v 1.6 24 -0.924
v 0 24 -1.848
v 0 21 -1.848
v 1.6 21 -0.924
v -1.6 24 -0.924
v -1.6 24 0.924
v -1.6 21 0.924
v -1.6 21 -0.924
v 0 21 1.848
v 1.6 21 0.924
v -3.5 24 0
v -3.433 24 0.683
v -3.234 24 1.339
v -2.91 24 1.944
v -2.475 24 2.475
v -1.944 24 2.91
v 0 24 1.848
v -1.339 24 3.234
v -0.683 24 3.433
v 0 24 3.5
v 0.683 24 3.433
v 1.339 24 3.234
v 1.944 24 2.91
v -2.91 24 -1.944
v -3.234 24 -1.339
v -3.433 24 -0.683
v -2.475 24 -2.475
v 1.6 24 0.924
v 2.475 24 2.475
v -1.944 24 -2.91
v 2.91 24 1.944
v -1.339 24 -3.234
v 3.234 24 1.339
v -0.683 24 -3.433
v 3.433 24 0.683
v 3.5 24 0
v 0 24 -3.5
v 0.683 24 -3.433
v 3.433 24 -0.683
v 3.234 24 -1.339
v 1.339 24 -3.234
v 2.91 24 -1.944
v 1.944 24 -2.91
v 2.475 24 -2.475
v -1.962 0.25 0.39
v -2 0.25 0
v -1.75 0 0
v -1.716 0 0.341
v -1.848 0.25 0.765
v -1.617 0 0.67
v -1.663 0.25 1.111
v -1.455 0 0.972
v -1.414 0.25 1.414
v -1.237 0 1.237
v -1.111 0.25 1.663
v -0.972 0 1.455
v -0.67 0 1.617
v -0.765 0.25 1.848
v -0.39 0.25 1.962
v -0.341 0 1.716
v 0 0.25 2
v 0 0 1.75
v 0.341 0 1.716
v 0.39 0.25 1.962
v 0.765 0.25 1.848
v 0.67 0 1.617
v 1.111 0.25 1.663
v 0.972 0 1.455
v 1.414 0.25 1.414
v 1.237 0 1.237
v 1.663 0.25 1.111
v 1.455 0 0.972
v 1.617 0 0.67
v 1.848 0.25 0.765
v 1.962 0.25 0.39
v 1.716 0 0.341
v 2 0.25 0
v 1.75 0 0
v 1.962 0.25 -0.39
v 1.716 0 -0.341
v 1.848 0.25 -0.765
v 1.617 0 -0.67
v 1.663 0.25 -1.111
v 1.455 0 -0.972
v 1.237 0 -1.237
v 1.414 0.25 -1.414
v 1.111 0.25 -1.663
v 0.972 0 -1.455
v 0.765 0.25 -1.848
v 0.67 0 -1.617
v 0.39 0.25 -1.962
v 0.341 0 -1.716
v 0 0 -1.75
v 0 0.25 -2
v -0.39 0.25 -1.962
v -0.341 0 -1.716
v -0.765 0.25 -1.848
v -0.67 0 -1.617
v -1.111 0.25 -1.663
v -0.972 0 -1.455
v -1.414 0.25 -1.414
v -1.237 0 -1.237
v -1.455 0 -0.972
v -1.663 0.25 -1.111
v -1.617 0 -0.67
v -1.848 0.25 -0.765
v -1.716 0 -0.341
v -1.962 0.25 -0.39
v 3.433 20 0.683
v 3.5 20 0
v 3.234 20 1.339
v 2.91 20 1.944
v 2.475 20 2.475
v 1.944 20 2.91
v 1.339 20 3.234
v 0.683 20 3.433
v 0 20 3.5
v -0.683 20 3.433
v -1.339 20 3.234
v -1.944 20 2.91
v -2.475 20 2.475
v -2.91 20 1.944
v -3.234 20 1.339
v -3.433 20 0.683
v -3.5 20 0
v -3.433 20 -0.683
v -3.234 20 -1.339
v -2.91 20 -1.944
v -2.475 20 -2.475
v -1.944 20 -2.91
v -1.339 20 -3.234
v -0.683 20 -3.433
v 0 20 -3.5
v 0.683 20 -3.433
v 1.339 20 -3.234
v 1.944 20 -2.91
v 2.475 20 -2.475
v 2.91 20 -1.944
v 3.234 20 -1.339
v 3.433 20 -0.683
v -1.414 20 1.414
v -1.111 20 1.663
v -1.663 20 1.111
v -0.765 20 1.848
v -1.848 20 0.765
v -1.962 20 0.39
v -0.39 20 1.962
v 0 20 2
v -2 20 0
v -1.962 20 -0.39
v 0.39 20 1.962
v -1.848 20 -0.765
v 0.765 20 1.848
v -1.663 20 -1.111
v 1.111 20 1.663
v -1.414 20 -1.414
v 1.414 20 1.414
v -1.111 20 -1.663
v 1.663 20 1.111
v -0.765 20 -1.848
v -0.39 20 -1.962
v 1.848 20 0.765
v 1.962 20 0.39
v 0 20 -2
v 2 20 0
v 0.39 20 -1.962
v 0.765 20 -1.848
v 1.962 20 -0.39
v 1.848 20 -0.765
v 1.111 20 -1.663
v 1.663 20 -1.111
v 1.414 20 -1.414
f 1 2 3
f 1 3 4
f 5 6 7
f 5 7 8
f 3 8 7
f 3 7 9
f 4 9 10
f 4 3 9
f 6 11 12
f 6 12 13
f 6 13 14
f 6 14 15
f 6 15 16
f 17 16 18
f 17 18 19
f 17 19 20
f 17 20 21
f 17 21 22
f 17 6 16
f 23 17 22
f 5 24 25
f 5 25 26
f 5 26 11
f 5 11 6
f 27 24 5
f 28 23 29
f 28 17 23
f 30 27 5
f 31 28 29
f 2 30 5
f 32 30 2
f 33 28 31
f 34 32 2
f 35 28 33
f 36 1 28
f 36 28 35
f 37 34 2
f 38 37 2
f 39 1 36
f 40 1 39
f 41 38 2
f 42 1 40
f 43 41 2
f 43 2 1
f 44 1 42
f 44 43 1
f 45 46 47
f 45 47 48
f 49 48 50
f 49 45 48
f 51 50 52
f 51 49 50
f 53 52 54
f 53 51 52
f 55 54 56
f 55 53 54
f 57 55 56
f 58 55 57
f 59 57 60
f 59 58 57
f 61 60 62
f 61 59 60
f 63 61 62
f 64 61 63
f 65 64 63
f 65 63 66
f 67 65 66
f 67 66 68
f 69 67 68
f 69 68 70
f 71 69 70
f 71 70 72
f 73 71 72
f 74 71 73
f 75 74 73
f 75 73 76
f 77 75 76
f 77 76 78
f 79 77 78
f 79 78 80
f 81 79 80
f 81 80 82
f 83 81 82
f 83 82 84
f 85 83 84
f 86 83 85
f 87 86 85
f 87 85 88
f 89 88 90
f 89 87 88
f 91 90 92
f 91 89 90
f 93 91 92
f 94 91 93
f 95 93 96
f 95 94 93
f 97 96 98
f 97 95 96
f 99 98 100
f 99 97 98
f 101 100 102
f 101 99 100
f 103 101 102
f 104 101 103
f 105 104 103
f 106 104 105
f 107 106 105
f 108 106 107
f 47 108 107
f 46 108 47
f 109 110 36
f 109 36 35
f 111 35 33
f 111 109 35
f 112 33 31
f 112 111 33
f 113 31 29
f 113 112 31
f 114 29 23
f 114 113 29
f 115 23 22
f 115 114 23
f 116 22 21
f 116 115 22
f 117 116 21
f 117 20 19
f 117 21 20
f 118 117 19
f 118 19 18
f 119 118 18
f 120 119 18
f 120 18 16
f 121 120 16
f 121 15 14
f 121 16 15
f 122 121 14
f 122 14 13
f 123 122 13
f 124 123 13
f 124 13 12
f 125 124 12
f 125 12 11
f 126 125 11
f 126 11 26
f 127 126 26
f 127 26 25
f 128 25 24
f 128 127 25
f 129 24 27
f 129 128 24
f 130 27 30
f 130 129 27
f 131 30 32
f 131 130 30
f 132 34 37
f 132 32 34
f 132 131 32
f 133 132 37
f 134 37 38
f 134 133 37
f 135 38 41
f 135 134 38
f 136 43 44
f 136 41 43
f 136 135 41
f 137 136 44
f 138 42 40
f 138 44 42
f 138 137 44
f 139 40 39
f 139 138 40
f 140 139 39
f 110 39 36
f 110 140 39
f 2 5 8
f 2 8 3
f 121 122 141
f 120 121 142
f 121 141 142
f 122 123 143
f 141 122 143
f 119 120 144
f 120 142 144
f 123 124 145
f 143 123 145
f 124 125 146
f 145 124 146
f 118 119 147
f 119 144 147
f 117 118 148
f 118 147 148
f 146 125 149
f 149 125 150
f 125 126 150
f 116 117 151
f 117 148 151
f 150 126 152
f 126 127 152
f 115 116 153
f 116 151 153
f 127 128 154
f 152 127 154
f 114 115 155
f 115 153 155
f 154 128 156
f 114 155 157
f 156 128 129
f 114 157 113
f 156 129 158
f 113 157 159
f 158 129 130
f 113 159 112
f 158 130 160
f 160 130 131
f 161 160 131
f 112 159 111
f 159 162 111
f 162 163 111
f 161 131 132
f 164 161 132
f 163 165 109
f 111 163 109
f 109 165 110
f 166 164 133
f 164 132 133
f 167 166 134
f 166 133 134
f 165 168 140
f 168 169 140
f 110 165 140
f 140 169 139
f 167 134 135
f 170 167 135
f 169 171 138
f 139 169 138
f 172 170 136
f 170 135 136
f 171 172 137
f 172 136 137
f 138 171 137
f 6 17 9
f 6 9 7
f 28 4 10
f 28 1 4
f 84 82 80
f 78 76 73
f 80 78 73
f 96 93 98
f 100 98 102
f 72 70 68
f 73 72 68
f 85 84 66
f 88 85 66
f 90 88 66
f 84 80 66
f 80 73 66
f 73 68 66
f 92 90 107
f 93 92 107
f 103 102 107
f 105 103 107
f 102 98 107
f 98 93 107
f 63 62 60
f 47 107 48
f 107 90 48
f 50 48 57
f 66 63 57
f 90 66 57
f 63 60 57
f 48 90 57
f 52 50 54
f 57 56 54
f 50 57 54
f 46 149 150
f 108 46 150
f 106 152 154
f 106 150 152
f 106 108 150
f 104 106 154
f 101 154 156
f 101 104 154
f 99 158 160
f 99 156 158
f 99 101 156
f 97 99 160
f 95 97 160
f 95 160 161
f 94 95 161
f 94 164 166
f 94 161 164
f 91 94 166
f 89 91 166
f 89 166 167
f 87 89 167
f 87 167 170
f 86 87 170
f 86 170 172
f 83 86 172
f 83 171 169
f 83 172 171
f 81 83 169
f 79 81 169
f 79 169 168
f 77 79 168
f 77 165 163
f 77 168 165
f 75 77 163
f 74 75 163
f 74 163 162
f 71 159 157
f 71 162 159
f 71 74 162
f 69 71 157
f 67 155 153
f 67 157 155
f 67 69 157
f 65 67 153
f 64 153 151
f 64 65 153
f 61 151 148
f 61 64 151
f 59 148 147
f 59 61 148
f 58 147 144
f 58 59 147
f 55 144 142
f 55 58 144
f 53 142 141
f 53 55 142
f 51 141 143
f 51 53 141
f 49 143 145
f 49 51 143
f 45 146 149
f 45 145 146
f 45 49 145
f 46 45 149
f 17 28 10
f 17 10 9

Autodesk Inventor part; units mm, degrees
ref_plane "YZ Plane" through (0, 0, 0) normal (1, 0, 0) x (0, 1, 0)
ref_plane "XZ Plane" through (0, 0, 0) normal (0, 1, 0) x (-1, 0, 0)
ref_plane "XY Plane" through (0, 0, 0) normal (0, 0, 1) x (1, 0, 0)
sketch "Sketch1" plane through (0, 0, 0) normal (0, 1, 0) x (-1, 0, 0)
  circle A0 centre (0, 0) radius 2
  dimension "d0" = 4
extrude "Extrusion1" add sketch "Sketch1" along normal blind 20
sketch "Sketch2" plane through (0, 20, 0) normal (0, 1, 0) x (1, 0, 0)
  circle A0 centre (0, 0) radius 2 projected
  circle A1 centre (0, 0) radius 3.5
  dimension "d3" = 7
extrude "Extrusion2" add sketch "Sketch2" along normal blind 4 contours A0 | A1
sketch "Sketch3" plane through (0, 24, 0) normal (0, 1, 0) x (1, 0, 0)
  circle A0 centre (0, 0) radius 3.5 projected
  line L0 (0, 1.8475) -> (1.6, 0.9238)
  line L1 (1.6, 0.9238) -> (1.6, -0.9238)
  line L2 (1.6, -0.9238) -> (0, -1.8475)
  line L3 (0, -1.8475) -> (-1.6, -0.9238)
  line L4 (-1.6, -0.9238) -> (-1.6, 0.9238)
  line L5 (-1.6, 0.9238) -> (0, 1.8475)
  dimension "d6" = 1.6
extrude "Extrusion3" cut sketch "Sketch3" against normal blind 3 contours L0 L1 L2 L3 L4 L5
thread "Thread1" size "M4x0.7" class "6g" standard "ANSI Metric M Profile" full length
chamfer "Chamfer1" distance 0.25 angle 45 1 edges at (2, 0, 0)
properties part number "M4x20SHCS"
